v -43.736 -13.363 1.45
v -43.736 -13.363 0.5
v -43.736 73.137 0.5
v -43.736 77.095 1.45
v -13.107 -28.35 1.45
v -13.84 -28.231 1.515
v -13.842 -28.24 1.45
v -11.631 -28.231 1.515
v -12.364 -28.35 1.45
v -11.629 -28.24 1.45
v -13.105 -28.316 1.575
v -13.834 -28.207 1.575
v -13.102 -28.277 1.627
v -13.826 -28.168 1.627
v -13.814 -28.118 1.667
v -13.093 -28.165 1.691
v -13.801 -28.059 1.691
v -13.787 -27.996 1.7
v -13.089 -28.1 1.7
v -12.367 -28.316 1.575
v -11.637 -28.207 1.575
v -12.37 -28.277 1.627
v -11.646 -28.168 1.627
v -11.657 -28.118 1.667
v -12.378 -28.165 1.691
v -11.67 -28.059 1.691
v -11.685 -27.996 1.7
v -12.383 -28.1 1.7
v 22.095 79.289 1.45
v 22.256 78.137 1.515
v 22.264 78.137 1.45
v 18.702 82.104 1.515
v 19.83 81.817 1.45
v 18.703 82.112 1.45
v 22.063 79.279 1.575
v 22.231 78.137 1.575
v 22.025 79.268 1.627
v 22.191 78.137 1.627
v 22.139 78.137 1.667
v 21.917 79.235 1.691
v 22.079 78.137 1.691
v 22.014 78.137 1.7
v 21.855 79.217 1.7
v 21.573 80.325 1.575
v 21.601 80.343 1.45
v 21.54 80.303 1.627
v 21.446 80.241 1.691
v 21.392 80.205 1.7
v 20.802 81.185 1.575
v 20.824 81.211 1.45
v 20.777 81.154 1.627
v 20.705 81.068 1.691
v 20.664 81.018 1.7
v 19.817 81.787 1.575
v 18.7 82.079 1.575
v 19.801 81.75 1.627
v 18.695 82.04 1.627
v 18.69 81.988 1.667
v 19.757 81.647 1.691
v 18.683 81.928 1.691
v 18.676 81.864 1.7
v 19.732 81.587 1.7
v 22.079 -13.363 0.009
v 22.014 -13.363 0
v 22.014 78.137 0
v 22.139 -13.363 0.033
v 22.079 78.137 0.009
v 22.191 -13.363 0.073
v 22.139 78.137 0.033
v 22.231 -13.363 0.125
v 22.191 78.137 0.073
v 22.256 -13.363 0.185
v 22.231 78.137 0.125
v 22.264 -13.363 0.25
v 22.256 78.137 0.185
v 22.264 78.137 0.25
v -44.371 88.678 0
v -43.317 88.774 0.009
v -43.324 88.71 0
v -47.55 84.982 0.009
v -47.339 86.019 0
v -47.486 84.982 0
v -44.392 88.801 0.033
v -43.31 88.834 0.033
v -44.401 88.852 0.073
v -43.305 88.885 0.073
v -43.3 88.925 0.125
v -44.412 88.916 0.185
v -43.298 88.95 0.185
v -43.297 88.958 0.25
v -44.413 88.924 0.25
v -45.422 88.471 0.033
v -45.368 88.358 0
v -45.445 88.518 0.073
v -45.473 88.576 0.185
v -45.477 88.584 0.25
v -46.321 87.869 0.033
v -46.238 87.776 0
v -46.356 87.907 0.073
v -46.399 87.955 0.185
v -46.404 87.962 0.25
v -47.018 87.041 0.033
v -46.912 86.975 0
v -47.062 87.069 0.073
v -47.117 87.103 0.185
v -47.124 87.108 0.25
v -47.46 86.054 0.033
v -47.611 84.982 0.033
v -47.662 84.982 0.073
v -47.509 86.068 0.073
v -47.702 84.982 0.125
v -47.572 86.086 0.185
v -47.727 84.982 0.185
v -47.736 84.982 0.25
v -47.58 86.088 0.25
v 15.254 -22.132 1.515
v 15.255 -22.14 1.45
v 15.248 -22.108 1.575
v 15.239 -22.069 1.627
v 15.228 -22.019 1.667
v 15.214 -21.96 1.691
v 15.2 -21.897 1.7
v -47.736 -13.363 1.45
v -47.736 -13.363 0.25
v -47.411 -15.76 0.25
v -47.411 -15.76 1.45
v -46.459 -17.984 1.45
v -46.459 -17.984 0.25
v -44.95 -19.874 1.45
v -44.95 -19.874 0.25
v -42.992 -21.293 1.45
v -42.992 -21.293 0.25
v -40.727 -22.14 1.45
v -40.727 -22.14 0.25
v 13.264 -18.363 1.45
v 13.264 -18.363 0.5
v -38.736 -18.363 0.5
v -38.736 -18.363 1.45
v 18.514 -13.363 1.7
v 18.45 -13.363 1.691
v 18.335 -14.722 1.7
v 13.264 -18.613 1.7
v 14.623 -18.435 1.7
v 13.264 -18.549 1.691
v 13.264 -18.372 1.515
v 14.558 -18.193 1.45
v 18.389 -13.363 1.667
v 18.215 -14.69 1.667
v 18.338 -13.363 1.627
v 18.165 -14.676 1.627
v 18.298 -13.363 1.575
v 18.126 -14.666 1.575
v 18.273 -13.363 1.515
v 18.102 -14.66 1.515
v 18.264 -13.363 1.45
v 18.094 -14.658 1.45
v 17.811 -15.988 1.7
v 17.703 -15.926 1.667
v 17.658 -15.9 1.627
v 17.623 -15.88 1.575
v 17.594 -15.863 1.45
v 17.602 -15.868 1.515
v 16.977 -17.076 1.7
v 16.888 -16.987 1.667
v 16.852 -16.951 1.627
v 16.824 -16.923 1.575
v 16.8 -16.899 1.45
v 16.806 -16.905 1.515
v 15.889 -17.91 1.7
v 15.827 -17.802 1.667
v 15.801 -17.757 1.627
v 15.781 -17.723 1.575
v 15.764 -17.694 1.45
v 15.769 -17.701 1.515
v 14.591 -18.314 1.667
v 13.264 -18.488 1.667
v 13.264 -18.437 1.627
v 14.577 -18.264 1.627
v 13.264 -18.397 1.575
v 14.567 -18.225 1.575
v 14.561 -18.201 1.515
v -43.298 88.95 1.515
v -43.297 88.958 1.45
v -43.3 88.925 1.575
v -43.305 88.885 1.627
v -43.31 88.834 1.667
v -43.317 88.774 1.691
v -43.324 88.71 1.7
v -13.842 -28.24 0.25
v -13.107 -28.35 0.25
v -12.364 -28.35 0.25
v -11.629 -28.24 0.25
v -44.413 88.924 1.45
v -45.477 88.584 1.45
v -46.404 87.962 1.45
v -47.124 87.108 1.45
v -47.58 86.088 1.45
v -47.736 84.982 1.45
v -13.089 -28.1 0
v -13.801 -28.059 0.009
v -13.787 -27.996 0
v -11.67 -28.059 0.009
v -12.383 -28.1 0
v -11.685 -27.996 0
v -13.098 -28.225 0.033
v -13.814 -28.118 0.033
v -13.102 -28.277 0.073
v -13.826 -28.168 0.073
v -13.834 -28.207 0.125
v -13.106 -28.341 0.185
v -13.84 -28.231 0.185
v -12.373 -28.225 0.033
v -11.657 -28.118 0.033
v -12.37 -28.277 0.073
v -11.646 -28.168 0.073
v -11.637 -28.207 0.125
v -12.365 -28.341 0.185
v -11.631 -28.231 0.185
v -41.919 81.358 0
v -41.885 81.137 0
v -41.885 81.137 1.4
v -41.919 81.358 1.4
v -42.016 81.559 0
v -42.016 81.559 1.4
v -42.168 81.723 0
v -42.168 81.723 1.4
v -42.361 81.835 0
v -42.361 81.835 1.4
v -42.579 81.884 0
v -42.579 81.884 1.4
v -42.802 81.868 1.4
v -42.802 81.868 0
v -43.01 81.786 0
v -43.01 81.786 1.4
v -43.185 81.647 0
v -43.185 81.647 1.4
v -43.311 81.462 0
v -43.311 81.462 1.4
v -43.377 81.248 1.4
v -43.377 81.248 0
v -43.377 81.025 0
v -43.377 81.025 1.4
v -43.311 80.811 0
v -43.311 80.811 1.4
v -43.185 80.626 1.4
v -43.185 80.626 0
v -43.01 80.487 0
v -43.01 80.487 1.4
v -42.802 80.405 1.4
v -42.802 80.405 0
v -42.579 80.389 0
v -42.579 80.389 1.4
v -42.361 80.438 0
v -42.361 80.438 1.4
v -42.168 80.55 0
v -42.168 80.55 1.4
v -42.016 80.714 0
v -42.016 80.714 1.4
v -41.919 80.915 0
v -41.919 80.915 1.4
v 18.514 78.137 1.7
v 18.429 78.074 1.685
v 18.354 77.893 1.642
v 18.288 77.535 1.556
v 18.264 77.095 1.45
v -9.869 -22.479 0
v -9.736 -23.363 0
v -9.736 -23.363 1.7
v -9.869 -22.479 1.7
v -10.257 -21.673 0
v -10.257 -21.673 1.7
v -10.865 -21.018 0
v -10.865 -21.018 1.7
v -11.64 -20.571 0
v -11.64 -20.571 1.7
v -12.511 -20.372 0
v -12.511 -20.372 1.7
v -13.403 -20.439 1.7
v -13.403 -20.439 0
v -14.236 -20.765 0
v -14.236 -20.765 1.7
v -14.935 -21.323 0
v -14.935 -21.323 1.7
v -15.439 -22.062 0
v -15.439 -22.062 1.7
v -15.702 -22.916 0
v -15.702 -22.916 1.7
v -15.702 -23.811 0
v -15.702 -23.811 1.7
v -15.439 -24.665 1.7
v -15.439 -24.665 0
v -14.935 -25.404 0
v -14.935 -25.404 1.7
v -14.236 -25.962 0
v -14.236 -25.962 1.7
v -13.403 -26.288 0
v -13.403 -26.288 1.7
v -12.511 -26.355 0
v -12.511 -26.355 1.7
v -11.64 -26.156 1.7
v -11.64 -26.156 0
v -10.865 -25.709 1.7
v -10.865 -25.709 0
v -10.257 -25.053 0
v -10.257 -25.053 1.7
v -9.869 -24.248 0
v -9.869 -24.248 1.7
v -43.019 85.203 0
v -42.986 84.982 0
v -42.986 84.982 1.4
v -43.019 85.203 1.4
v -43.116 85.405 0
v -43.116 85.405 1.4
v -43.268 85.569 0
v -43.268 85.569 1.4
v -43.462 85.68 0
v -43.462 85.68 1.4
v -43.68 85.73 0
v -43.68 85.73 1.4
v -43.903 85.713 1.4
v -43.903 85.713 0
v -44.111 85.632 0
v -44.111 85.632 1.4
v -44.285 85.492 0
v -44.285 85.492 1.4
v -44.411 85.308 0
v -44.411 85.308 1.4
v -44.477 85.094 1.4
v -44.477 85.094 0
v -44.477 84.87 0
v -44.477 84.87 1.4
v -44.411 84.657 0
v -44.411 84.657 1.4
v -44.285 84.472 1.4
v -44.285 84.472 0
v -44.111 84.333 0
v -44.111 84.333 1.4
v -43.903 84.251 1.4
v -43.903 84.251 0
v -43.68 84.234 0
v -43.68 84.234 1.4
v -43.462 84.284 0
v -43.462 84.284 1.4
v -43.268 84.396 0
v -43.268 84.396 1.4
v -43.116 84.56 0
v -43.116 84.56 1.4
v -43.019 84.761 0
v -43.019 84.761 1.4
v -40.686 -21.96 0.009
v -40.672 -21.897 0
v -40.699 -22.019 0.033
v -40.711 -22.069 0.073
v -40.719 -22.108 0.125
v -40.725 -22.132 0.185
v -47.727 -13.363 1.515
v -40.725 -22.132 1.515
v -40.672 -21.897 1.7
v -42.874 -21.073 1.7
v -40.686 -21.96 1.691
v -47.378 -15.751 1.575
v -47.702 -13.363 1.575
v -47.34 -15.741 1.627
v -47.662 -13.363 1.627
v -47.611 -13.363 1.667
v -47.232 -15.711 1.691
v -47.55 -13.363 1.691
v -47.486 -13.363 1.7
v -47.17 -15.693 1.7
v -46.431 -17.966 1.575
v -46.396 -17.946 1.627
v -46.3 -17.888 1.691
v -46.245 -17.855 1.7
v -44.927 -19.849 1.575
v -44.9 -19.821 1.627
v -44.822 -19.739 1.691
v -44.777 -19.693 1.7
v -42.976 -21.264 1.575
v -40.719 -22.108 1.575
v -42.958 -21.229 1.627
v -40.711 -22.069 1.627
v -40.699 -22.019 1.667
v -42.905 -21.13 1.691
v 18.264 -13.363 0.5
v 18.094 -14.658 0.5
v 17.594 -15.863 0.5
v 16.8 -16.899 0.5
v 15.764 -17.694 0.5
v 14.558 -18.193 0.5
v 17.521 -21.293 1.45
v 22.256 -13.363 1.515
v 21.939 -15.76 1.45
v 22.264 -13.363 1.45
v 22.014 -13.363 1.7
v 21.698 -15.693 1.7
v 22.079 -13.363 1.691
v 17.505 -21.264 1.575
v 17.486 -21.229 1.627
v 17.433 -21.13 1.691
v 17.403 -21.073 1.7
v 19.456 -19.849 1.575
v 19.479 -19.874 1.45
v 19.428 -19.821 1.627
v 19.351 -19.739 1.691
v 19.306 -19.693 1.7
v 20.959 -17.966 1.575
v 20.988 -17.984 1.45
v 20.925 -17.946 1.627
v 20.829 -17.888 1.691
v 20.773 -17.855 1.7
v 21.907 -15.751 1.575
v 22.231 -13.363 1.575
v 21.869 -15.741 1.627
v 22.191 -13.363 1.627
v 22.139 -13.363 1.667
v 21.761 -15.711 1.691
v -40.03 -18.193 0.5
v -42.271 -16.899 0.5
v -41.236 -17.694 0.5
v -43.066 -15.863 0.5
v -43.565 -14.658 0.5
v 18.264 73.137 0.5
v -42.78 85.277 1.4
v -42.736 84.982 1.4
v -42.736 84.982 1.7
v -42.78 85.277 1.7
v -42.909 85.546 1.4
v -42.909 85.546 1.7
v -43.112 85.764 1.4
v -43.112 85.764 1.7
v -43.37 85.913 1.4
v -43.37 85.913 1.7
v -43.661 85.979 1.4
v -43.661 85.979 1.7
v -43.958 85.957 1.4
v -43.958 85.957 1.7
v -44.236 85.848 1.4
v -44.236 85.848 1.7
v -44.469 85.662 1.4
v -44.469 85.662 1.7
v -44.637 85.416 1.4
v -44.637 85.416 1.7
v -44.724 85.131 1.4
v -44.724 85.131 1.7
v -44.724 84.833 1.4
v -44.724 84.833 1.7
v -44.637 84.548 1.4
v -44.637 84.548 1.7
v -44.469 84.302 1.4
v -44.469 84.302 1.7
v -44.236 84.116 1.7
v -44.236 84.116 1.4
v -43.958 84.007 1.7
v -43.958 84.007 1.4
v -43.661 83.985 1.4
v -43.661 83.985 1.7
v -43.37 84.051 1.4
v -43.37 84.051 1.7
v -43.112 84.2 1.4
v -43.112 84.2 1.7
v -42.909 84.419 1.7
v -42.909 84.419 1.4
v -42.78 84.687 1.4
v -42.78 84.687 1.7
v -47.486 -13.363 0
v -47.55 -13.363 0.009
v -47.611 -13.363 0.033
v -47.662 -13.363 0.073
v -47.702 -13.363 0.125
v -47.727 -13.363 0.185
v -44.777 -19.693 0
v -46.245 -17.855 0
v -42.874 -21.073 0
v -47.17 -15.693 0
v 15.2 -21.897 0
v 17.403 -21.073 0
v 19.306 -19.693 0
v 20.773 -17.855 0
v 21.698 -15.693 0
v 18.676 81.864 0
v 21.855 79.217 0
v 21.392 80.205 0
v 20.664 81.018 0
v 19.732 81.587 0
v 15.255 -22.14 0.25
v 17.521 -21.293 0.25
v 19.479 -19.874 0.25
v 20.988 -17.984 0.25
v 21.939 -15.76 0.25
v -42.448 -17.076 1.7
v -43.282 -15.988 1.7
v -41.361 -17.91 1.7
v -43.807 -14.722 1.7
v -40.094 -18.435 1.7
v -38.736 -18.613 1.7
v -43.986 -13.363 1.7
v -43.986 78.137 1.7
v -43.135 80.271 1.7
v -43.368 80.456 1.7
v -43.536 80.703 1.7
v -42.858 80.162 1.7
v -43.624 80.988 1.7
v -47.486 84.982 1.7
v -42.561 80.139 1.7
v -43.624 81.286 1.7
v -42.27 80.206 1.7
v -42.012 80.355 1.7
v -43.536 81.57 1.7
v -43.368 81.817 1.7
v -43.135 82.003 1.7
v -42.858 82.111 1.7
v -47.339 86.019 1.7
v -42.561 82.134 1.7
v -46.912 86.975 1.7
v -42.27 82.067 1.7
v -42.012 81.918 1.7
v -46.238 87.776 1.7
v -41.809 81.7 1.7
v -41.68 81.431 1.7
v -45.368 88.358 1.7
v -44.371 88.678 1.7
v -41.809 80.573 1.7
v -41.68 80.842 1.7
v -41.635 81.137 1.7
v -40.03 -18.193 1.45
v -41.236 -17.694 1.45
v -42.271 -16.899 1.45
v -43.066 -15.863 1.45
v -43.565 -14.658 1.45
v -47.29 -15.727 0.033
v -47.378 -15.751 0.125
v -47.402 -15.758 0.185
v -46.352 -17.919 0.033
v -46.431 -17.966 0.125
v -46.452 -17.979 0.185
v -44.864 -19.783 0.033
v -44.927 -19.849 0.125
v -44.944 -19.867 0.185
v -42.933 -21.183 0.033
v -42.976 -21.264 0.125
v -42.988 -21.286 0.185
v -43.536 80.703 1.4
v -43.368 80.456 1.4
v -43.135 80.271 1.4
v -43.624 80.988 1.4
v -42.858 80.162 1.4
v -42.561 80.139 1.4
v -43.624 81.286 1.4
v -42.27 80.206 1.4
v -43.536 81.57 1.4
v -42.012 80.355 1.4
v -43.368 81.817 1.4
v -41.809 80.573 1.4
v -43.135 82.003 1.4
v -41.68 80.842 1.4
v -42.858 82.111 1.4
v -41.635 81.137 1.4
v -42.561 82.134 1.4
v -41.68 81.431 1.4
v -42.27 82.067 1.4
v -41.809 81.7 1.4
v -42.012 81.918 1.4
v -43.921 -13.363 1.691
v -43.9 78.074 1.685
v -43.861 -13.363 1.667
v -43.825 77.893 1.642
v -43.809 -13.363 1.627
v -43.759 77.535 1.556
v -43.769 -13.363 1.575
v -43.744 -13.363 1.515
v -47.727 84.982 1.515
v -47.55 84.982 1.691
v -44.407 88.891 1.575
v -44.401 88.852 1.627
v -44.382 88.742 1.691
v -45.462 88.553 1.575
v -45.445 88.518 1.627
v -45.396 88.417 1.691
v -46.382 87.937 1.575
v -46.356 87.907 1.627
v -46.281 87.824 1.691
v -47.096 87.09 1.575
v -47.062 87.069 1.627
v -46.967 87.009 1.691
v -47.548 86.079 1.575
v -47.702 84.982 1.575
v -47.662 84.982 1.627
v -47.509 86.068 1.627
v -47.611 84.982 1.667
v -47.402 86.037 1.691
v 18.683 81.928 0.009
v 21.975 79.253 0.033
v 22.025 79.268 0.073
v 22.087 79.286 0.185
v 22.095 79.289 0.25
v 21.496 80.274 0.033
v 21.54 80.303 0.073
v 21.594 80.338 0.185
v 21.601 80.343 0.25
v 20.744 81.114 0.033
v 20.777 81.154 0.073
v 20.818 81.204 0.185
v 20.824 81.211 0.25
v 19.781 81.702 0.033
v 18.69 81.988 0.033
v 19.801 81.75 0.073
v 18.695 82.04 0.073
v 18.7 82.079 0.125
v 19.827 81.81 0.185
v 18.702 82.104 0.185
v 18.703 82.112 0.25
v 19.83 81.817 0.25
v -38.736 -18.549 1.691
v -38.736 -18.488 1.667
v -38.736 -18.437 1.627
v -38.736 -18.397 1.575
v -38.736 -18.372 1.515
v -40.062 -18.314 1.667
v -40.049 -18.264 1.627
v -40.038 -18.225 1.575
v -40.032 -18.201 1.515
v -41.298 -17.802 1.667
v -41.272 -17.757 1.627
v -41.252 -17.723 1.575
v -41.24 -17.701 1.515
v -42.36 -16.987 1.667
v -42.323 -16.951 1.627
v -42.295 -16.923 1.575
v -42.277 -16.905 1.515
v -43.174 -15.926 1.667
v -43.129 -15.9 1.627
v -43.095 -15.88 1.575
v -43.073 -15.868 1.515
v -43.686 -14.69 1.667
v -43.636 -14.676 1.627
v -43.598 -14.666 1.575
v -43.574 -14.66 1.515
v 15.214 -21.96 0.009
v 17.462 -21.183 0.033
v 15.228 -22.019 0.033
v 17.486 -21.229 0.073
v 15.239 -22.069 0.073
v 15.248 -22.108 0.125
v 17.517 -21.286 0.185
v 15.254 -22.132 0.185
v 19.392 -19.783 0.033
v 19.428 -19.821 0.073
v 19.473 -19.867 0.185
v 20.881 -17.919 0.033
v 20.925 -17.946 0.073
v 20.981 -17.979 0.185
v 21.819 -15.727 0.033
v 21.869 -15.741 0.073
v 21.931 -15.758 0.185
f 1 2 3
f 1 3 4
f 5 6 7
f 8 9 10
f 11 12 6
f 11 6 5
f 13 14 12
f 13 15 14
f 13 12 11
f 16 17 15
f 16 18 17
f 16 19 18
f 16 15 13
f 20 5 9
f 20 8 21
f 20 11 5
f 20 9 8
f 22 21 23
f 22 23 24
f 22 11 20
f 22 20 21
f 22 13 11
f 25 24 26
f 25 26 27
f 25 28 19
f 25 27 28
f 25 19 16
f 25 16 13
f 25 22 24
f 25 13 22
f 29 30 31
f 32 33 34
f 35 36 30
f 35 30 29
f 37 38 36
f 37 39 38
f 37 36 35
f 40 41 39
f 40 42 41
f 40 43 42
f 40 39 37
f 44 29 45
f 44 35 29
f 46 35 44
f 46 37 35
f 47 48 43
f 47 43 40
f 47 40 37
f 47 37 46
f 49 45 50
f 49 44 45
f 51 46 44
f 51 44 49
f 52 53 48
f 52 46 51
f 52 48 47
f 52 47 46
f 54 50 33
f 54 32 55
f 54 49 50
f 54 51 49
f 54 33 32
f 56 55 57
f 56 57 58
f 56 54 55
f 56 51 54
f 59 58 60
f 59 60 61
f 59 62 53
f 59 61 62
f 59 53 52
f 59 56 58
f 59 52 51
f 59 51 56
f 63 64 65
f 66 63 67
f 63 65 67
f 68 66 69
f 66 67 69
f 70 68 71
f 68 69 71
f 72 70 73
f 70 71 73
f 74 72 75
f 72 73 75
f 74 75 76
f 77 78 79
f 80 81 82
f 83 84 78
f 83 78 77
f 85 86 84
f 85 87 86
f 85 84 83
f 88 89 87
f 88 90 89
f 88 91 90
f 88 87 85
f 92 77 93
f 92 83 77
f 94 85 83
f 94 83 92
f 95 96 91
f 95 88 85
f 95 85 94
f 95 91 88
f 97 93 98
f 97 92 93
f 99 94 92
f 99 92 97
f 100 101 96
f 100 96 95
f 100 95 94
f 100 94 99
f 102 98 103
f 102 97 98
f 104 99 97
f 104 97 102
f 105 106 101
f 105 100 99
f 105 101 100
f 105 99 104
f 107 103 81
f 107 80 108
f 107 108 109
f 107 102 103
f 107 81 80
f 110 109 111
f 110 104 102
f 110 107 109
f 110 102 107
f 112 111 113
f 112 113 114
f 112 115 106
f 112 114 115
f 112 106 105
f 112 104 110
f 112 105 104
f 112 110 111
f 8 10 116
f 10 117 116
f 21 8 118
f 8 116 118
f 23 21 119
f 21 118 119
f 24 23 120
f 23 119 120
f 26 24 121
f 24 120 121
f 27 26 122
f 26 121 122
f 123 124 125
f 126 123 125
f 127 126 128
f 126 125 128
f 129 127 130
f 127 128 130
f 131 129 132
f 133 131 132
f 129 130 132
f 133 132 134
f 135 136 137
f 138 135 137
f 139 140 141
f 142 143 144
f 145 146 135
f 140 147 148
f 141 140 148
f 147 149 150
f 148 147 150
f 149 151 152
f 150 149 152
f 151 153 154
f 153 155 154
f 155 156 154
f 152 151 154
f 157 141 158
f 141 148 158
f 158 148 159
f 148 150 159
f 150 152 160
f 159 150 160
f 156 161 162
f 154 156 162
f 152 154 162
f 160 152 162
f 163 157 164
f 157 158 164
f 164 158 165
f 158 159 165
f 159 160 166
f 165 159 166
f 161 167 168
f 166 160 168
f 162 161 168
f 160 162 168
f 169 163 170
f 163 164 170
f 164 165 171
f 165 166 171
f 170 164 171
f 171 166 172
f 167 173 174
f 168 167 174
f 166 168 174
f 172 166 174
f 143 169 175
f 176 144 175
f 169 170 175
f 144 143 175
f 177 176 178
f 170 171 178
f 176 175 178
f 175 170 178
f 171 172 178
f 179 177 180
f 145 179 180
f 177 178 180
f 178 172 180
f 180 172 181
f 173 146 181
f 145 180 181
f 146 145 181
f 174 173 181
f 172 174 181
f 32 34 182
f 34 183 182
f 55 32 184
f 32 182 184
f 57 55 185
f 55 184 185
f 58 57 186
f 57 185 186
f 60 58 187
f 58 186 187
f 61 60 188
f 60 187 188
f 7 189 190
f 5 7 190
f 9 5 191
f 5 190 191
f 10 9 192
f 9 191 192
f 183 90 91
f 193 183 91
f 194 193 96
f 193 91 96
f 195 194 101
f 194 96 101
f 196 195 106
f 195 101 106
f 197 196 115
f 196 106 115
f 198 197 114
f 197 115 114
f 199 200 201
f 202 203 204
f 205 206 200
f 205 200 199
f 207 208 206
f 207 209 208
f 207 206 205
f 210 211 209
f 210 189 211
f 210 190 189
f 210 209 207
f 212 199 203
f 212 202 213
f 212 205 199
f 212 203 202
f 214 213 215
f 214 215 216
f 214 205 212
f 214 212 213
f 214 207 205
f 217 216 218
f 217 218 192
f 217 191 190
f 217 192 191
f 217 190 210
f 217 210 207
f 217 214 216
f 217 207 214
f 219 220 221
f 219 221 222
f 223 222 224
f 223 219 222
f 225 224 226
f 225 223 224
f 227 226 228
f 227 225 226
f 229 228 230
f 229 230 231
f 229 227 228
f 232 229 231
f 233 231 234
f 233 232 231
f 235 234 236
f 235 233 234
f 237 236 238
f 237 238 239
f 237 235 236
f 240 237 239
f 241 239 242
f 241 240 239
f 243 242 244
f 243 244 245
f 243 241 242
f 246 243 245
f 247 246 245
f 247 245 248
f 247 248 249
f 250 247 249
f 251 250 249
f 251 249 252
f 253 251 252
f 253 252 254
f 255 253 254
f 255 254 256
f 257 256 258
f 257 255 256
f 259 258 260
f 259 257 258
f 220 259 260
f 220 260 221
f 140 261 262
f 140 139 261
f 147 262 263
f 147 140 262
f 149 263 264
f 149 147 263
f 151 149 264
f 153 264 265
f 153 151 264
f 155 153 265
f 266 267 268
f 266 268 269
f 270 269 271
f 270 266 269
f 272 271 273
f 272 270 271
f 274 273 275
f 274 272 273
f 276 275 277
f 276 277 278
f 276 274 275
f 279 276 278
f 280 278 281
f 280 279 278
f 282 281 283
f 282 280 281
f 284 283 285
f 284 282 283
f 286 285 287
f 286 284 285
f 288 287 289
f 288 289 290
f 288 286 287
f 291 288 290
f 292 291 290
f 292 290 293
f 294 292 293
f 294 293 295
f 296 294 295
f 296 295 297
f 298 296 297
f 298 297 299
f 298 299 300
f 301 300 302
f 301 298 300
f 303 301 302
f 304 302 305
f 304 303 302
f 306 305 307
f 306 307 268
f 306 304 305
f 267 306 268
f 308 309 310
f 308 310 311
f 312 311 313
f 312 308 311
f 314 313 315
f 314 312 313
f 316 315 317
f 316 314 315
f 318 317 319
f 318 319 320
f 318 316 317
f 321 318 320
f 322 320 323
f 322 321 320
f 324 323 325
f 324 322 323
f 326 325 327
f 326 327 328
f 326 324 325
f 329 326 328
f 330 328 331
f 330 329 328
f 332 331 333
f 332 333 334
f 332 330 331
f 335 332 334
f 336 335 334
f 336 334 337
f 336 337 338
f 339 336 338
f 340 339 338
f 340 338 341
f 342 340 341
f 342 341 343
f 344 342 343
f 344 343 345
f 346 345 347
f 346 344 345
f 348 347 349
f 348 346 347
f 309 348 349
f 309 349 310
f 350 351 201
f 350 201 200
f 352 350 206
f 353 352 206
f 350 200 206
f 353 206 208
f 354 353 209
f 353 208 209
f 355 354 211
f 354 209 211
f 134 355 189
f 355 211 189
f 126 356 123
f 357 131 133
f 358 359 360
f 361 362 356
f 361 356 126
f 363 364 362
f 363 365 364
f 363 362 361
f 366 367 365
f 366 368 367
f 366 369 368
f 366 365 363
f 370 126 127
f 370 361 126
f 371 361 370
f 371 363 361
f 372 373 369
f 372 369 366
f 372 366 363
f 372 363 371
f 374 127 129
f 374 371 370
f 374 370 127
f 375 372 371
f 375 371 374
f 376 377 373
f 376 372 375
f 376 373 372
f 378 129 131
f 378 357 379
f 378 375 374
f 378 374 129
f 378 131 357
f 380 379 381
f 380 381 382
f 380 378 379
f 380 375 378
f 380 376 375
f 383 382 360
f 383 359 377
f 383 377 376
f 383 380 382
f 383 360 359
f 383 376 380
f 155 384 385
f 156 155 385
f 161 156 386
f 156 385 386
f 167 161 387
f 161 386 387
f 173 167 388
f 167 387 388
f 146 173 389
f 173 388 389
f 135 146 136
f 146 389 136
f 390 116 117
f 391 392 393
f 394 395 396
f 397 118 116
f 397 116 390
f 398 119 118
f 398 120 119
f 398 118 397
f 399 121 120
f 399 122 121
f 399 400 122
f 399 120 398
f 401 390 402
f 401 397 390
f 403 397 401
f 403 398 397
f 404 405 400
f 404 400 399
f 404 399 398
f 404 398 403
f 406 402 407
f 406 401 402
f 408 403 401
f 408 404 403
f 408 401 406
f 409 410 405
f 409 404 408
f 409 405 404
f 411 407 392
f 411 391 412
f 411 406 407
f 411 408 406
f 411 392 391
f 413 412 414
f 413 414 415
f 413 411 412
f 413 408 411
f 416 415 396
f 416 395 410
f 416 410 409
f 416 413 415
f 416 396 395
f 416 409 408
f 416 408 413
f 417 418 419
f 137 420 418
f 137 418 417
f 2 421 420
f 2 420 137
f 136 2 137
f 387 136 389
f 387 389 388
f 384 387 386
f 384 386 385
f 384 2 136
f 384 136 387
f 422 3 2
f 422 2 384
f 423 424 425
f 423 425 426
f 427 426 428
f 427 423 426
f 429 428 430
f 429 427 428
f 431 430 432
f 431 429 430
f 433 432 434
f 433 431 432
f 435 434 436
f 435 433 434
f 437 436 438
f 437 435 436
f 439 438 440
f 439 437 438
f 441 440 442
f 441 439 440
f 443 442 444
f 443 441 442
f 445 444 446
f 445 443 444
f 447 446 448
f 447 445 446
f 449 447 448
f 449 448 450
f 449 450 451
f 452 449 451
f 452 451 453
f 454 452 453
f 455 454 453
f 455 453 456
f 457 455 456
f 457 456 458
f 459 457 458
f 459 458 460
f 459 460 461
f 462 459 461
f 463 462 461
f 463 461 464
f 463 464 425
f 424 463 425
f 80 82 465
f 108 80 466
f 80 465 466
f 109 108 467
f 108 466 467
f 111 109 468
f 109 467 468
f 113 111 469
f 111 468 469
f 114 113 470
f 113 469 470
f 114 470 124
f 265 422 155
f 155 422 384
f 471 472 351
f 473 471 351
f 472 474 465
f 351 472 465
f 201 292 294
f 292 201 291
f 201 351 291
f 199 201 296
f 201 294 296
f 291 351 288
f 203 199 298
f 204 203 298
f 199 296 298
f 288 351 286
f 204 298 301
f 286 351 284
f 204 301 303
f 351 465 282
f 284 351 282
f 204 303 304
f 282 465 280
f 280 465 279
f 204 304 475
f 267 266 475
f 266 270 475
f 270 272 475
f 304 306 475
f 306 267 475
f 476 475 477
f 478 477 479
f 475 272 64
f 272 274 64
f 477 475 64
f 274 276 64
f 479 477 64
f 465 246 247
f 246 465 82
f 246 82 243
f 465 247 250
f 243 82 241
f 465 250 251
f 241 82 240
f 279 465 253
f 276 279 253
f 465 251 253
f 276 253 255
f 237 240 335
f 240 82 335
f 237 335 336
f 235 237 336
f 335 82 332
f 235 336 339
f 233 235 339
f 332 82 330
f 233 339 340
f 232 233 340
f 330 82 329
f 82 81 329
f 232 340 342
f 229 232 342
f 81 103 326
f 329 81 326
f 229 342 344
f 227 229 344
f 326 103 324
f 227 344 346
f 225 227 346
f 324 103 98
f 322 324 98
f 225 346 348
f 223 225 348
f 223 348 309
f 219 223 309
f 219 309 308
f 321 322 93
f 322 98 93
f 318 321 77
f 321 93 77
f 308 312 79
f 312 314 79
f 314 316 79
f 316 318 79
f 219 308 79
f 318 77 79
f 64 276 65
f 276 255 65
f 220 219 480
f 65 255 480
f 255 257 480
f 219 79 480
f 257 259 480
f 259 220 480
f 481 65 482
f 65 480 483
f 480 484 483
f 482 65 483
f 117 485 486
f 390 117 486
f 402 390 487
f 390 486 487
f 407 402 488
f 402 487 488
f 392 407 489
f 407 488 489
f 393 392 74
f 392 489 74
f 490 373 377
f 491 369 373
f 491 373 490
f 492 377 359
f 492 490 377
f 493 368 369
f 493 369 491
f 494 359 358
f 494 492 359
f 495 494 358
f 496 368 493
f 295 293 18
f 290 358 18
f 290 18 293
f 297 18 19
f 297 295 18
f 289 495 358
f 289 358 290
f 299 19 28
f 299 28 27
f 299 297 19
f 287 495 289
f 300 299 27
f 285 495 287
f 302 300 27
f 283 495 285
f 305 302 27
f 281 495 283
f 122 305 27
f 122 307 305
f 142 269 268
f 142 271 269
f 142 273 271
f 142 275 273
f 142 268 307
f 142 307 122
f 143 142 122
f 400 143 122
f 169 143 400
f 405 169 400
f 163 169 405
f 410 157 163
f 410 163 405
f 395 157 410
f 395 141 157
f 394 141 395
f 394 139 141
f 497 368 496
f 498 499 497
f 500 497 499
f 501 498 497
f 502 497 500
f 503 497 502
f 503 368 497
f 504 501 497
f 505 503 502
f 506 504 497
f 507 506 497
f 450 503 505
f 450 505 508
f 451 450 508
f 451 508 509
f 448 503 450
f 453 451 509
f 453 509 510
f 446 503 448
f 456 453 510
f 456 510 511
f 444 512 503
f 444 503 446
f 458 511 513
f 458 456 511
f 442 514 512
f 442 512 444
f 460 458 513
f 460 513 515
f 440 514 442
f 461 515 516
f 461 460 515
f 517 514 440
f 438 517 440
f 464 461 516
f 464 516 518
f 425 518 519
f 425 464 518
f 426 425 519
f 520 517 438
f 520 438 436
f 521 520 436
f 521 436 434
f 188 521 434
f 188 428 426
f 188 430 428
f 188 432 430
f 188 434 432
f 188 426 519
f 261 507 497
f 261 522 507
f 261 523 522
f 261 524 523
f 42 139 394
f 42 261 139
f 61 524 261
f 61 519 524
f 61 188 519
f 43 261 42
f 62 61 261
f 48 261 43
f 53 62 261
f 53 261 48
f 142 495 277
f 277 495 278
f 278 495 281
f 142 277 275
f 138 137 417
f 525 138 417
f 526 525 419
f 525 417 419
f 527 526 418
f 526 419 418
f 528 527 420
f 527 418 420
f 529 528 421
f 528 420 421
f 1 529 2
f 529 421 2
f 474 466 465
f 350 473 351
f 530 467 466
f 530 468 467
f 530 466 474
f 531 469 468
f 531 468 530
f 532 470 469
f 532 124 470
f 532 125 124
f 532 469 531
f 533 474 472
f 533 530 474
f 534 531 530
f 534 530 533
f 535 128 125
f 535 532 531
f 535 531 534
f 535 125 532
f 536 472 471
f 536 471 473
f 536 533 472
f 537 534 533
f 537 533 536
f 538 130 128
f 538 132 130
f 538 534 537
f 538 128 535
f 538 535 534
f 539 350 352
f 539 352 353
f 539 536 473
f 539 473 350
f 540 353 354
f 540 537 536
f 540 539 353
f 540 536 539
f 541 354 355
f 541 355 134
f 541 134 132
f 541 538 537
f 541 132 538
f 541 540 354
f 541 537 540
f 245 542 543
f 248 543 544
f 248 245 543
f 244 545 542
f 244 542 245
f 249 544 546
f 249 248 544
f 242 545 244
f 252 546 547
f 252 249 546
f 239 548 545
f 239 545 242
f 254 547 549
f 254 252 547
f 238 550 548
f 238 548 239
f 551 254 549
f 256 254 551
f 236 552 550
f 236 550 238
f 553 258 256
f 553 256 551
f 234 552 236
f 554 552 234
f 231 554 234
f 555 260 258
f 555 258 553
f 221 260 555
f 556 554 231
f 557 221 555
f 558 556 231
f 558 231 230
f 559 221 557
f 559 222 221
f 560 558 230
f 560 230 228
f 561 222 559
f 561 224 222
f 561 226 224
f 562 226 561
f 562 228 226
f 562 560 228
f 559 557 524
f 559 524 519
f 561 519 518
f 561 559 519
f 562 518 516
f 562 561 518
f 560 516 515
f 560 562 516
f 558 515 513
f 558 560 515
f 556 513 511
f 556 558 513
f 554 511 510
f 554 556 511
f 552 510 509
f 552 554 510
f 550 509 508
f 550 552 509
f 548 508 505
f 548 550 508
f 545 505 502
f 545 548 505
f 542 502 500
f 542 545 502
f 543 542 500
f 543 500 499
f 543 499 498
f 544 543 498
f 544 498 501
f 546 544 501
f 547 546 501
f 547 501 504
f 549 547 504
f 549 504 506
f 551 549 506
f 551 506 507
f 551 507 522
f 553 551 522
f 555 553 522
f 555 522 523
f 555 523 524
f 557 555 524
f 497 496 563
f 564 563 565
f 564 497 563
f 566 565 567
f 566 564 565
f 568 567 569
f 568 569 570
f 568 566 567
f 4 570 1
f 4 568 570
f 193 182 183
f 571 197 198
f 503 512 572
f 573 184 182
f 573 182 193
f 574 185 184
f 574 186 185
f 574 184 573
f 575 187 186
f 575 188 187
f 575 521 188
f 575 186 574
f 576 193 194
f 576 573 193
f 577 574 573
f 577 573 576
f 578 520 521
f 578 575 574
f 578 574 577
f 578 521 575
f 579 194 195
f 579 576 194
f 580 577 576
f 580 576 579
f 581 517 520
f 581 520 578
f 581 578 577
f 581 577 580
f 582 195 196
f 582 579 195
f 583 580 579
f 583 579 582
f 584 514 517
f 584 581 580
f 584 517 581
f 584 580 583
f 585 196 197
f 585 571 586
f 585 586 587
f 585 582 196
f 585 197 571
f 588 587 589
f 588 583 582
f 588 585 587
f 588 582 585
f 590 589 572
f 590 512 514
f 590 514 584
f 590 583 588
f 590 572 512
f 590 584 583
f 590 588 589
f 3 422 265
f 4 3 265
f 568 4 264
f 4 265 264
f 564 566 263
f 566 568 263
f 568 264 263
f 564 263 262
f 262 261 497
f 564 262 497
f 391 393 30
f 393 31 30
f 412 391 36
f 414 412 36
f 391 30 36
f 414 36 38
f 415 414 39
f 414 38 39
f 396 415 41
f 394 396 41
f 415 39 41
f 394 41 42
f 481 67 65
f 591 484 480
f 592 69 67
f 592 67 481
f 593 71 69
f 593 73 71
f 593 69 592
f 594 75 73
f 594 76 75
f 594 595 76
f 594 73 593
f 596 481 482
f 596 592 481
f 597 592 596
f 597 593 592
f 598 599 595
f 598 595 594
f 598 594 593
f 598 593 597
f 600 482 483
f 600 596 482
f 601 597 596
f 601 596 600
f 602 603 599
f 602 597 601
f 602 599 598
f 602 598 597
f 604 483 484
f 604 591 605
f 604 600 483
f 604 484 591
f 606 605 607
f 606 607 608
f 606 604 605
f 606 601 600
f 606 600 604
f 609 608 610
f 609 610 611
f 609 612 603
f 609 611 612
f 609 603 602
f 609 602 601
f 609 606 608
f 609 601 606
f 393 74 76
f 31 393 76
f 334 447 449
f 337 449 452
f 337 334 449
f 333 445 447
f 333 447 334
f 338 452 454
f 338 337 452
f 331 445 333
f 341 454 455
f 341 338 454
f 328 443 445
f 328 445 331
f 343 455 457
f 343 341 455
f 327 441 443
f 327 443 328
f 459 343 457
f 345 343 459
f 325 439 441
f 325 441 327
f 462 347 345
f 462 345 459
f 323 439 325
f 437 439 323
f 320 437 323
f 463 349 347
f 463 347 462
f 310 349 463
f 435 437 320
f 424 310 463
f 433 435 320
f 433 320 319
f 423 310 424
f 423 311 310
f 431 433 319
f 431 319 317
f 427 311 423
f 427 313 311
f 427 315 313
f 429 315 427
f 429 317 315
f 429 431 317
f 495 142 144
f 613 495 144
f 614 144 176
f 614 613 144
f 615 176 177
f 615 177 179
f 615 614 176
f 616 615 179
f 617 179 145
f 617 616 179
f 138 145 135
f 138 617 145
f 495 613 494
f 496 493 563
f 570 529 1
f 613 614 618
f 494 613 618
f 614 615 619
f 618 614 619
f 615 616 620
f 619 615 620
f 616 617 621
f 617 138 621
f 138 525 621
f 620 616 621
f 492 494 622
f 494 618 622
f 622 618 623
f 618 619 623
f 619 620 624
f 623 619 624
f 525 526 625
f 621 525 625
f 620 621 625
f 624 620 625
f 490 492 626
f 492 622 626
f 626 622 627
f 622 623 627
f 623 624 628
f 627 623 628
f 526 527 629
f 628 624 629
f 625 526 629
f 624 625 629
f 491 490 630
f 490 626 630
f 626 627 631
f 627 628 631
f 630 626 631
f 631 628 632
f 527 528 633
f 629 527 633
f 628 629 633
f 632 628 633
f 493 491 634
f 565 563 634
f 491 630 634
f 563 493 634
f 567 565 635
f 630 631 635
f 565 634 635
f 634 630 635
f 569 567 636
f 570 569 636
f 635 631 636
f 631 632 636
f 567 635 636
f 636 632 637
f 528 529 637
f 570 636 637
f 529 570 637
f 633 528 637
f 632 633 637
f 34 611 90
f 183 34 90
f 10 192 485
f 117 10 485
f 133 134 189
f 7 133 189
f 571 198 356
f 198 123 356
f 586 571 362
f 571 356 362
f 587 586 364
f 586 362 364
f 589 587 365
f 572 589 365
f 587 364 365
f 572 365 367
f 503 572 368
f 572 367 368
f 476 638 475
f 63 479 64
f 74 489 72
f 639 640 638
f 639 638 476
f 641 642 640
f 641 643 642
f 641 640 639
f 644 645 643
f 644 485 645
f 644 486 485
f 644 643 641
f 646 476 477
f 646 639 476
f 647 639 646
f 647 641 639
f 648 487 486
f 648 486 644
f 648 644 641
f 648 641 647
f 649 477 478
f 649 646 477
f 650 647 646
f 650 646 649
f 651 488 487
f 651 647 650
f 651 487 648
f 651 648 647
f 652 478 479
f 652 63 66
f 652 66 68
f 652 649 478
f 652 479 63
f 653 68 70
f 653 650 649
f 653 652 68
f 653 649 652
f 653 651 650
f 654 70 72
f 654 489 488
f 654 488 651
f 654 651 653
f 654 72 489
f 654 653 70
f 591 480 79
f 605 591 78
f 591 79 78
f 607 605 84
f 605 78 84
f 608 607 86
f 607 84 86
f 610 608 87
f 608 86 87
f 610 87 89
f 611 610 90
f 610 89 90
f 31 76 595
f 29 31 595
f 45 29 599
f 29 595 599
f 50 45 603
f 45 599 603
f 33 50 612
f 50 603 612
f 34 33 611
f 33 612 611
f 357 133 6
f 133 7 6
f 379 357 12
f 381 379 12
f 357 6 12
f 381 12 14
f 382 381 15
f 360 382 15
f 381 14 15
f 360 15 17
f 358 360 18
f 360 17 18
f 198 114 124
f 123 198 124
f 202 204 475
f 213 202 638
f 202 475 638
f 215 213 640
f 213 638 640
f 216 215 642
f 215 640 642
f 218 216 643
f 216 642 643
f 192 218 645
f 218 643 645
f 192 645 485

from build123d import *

# Parameters (mm, degrees)
F4_R     = 3
F4_R_2   = 1
F5_DEPTH = 1.7
F6_DEPTH = 0.5
F8_DEPTH = 62
F4_R_3   = 0.75
F9_DEPTH = 1.4
F10_R    = 0.25


with BuildPart() as f5:
    # F4 (on Top) → F5 (new body)
    with BuildSketch(Plane.XY):
        with BuildLine():
            ThreePointArc((-43.2966782842, 88.958070665), (-46.4043790169, 87.9618261956), (-47.7356673777, 84.9822325677))
            Line((-47.7356673777, 84.9822325677), (-47.7356673777, -13.3634495586))
            ThreePointArc((-47.7356673777, -13.3634495586), (-45.7684587141, -18.9794842824), (-40.7268127068, -22.1404274143))
            Line((-40.7268127068, -22.1404274143), (-13.8418592272, -28.2395483673))
            ThreePointArc((-13.8418592272, -28.2395483673), (-12.7356673777, -28.3634495586), (-11.6294755282, -28.2395483673))
            Line((-11.6294755282, -28.2395483673), (15.2554779514, -22.1404274143))
            ThreePointArc((15.2554779514, -22.1404274143), (20.2971239587, -18.9794842824), (22.2643326223, -13.3634495586))
            Line((22.2643326223, -13.3634495586), (22.2643326223, 78.1365504414))
            ThreePointArc((22.2643326223, 78.1365504414), (21.2439262501, 80.8052620805), (18.7033217158, 82.1123885387))
            Line((18.7033217158, 82.1123885387), (-43.2966782842, 88.958070665))
        make_face()
        with Locations((-12.7356673777, -23.3634495586)):
            Circle(F4_R, mode=Mode.SUBTRACT)
        with BuildLine():
            Line((-43.7356673777, 73.1365504414), (-43.7356673777, 78.1365504414))
            Line((-43.7356673777, 78.1365504414), (18.2643326223, 78.1365504414))
            Line((18.2643326223, 78.1365504414), (18.2643326223, 73.1365504414))
            Line((18.2643326223, 73.1365504414), (18.2643326223, -13.3634495586))
            ThreePointArc((18.2643326223, -13.3634495586), (16.7998665282, -16.8989834645), (13.2643326223, -18.3634495586))
            Line((13.2643326223, -18.3634495586), (-38.7356673777, -18.3634495586))
            ThreePointArc((-38.7356673777, -18.3634495586), (-42.2712012836, -16.8989834645), (-43.7356673777, -13.3634495586))
            Line((-43.7356673777, -13.3634495586), (-43.7356673777, 73.1365504414))
        make_face(mode=Mode.SUBTRACT)
        with Locations((-42.6353360717, 81.1365504414)):
            Circle(F4_R_2, mode=Mode.SUBTRACT)
        with Locations((-43.7356673777, 84.9822325677)):
            Circle(F4_R_2, mode=Mode.SUBTRACT)
    extrude(amount=F5_DEPTH)

    # F4 (on Top) → F6 (join)
    with BuildSketch(Plane.XY):
        with BuildLine():
            Line((18.2643326223, 73.1365504414), (-43.7356673777, 73.1365504414))
            Line((-43.7356673777, 73.1365504414), (-43.7356673777, -13.3634495586))
            ThreePointArc((-43.7356673777, -13.3634495586), (-42.2712012836, -16.8989834645), (-38.7356673777, -18.3634495586))
            Line((-38.7356673777, -18.3634495586), (13.2643326223, -18.3634495586))
            ThreePointArc((13.2643326223, -18.3634495586), (16.7998665282, -16.8989834645), (18.2643326223, -13.3634495586))
            Line((18.2643326223, -13.3634495586), (18.2643326223, 73.1365504414))
        make_face()
    extrude(amount=F6_DEPTH)

    # F7 (on face) → F8 (join, through all)
    with BuildSketch(Plane(origin=(18.2643326223, 0, 0), x_dir=(0, -1, 0), z_dir=(-1, 0, 0))):
        Polygon((-73.1365504414, 0), (-73.1365504414, 0.5), (-78.1365504414, 1.7), (-78.1365504414, 0), align=None)
    extrude(amount=F8_DEPTH)

    # F4 (on Top) → F9 (join, through all)
    with BuildSketch(Plane.XY):
        with Locations((-43.7356673777, 84.9822325677)):
            Circle(F4_R_2)
        with Locations((-43.7356673777, 84.9822325677)):
            Circle(F4_R_3, mode=Mode.SUBTRACT)
        with Locations((-42.6353360717, 81.1365504414)):
            Circle(F4_R_2)
        with Locations((-42.6353360717, 81.1365504414)):
            Circle(F4_R_3, mode=Mode.SUBTRACT)
    extrude(amount=F9_DEPTH)

    # F10
    f10_edges = [f5.edges().sort_by_distance(p)[0] for p in [
        (-43.735667, 32.38655, 1.7),
        (22.264333, 32.38655, 1.7),
        (-27.284336, -25.189988, 0),
    ]]
    fillet(f10_edges, radius=F10_R)


solid = f5.part
